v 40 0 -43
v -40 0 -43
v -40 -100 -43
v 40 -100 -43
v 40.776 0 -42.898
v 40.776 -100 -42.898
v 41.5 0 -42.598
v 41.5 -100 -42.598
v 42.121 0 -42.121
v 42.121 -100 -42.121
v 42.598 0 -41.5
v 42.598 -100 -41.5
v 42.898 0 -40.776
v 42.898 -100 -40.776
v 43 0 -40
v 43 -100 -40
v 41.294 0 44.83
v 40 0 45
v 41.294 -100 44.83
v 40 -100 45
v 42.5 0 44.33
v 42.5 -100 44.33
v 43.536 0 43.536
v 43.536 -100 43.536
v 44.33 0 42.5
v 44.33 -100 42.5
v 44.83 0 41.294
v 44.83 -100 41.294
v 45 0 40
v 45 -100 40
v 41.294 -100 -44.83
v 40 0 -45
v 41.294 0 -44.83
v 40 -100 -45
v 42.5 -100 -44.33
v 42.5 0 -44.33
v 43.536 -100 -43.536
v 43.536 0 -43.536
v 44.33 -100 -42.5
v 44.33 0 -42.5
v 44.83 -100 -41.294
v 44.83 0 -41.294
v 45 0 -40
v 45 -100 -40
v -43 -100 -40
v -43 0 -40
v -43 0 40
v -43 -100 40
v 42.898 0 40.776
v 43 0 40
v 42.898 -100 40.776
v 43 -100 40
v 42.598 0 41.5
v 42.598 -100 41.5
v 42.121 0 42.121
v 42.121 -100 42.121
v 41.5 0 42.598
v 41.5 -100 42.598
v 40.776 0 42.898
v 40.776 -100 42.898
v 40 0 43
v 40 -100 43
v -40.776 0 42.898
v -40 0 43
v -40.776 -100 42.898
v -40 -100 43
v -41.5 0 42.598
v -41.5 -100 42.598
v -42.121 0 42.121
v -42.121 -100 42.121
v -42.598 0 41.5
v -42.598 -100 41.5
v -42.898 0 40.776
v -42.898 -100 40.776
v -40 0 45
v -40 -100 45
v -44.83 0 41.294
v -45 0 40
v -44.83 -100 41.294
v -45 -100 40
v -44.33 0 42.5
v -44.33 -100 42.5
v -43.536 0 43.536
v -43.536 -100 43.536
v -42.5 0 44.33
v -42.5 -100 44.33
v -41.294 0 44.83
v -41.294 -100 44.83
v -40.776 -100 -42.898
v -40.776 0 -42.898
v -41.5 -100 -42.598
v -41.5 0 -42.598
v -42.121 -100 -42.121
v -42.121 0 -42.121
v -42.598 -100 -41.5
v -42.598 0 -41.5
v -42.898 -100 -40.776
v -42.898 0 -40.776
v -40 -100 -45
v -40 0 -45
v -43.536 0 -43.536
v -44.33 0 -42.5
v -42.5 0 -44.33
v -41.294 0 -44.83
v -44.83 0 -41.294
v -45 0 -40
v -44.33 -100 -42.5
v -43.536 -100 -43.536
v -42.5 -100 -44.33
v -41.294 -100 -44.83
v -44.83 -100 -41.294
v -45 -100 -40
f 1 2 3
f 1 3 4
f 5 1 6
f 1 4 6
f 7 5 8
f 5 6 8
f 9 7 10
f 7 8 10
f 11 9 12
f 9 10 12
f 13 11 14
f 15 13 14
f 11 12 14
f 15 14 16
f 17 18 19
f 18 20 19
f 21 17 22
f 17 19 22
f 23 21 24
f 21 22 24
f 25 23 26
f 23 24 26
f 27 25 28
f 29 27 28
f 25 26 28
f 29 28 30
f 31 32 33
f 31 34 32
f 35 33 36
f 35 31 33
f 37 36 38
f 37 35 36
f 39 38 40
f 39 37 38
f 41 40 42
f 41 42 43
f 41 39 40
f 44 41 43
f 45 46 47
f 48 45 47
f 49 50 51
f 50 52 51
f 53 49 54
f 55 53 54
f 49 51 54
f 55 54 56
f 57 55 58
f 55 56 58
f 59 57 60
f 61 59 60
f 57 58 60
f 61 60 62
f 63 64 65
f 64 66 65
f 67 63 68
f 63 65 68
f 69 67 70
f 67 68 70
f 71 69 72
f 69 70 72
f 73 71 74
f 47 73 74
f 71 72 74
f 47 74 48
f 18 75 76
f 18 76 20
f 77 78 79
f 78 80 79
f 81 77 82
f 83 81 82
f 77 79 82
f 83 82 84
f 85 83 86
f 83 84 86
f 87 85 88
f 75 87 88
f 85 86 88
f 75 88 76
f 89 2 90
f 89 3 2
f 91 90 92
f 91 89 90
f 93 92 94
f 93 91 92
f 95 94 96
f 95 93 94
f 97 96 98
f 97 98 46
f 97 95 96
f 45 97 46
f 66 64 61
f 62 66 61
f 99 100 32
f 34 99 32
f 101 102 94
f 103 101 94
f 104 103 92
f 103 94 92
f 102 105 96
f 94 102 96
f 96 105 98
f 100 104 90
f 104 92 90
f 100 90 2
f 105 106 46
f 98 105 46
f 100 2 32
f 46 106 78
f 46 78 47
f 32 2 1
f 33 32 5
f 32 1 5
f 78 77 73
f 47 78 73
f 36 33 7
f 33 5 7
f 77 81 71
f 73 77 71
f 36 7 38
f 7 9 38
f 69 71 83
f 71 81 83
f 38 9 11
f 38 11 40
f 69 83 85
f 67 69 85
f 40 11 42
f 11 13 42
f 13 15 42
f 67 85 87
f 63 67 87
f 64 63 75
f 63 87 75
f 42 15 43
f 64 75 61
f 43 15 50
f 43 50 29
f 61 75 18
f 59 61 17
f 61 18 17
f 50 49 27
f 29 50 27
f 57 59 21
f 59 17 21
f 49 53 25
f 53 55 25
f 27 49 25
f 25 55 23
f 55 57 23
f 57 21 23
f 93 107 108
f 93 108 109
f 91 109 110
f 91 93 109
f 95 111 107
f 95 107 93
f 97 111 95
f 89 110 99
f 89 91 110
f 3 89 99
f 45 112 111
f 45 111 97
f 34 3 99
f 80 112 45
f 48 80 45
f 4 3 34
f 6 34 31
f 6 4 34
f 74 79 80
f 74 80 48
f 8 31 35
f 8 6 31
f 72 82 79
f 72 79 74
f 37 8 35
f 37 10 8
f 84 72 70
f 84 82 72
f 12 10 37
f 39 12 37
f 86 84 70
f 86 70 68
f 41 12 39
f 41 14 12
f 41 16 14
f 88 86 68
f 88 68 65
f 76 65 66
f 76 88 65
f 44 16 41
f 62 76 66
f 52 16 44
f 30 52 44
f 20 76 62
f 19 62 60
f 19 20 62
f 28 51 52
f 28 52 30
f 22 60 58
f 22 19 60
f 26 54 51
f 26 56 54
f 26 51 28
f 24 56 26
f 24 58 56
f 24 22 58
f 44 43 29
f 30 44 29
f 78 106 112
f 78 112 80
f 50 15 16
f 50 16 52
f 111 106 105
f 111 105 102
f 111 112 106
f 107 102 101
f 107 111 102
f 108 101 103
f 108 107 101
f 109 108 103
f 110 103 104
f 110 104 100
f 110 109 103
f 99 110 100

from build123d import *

# Parameters (mm, degrees)
F0_W     = 90
F0_H     = 90
F0_W_2   = 86
F0_H_2   = 86
F1_DEPTH = 100
F2_R     = 5
F3_R     = 3


with BuildPart() as f1:
    # F0 (on Front) → F1 (new body)
    with BuildSketch(Plane.XZ):
        Rectangle(F0_W, F0_H)
        Rectangle(F0_W_2, F0_H_2, mode=Mode.SUBTRACT)
    extrude(amount=F1_DEPTH)

    # F2
    f2_edges = [f1.edges().sort_by_distance(p)[0] for p in [
        (45, -50, 45),
        (-45, -50, 45),
        (45, -50, -45),
        (-45, -50, -45),
    ]]
    fillet(f2_edges, radius=F2_R)

    # F3
    f3_edges = [f1.edges().sort_by_distance(p)[0] for p in [
        (-43, -50, 43),
        (43, -50, 43),
        (-43, -50, -43),
        (43, -50, -43),
    ]]
    fillet(f3_edges, radius=F3_R)


solid = f1.part
